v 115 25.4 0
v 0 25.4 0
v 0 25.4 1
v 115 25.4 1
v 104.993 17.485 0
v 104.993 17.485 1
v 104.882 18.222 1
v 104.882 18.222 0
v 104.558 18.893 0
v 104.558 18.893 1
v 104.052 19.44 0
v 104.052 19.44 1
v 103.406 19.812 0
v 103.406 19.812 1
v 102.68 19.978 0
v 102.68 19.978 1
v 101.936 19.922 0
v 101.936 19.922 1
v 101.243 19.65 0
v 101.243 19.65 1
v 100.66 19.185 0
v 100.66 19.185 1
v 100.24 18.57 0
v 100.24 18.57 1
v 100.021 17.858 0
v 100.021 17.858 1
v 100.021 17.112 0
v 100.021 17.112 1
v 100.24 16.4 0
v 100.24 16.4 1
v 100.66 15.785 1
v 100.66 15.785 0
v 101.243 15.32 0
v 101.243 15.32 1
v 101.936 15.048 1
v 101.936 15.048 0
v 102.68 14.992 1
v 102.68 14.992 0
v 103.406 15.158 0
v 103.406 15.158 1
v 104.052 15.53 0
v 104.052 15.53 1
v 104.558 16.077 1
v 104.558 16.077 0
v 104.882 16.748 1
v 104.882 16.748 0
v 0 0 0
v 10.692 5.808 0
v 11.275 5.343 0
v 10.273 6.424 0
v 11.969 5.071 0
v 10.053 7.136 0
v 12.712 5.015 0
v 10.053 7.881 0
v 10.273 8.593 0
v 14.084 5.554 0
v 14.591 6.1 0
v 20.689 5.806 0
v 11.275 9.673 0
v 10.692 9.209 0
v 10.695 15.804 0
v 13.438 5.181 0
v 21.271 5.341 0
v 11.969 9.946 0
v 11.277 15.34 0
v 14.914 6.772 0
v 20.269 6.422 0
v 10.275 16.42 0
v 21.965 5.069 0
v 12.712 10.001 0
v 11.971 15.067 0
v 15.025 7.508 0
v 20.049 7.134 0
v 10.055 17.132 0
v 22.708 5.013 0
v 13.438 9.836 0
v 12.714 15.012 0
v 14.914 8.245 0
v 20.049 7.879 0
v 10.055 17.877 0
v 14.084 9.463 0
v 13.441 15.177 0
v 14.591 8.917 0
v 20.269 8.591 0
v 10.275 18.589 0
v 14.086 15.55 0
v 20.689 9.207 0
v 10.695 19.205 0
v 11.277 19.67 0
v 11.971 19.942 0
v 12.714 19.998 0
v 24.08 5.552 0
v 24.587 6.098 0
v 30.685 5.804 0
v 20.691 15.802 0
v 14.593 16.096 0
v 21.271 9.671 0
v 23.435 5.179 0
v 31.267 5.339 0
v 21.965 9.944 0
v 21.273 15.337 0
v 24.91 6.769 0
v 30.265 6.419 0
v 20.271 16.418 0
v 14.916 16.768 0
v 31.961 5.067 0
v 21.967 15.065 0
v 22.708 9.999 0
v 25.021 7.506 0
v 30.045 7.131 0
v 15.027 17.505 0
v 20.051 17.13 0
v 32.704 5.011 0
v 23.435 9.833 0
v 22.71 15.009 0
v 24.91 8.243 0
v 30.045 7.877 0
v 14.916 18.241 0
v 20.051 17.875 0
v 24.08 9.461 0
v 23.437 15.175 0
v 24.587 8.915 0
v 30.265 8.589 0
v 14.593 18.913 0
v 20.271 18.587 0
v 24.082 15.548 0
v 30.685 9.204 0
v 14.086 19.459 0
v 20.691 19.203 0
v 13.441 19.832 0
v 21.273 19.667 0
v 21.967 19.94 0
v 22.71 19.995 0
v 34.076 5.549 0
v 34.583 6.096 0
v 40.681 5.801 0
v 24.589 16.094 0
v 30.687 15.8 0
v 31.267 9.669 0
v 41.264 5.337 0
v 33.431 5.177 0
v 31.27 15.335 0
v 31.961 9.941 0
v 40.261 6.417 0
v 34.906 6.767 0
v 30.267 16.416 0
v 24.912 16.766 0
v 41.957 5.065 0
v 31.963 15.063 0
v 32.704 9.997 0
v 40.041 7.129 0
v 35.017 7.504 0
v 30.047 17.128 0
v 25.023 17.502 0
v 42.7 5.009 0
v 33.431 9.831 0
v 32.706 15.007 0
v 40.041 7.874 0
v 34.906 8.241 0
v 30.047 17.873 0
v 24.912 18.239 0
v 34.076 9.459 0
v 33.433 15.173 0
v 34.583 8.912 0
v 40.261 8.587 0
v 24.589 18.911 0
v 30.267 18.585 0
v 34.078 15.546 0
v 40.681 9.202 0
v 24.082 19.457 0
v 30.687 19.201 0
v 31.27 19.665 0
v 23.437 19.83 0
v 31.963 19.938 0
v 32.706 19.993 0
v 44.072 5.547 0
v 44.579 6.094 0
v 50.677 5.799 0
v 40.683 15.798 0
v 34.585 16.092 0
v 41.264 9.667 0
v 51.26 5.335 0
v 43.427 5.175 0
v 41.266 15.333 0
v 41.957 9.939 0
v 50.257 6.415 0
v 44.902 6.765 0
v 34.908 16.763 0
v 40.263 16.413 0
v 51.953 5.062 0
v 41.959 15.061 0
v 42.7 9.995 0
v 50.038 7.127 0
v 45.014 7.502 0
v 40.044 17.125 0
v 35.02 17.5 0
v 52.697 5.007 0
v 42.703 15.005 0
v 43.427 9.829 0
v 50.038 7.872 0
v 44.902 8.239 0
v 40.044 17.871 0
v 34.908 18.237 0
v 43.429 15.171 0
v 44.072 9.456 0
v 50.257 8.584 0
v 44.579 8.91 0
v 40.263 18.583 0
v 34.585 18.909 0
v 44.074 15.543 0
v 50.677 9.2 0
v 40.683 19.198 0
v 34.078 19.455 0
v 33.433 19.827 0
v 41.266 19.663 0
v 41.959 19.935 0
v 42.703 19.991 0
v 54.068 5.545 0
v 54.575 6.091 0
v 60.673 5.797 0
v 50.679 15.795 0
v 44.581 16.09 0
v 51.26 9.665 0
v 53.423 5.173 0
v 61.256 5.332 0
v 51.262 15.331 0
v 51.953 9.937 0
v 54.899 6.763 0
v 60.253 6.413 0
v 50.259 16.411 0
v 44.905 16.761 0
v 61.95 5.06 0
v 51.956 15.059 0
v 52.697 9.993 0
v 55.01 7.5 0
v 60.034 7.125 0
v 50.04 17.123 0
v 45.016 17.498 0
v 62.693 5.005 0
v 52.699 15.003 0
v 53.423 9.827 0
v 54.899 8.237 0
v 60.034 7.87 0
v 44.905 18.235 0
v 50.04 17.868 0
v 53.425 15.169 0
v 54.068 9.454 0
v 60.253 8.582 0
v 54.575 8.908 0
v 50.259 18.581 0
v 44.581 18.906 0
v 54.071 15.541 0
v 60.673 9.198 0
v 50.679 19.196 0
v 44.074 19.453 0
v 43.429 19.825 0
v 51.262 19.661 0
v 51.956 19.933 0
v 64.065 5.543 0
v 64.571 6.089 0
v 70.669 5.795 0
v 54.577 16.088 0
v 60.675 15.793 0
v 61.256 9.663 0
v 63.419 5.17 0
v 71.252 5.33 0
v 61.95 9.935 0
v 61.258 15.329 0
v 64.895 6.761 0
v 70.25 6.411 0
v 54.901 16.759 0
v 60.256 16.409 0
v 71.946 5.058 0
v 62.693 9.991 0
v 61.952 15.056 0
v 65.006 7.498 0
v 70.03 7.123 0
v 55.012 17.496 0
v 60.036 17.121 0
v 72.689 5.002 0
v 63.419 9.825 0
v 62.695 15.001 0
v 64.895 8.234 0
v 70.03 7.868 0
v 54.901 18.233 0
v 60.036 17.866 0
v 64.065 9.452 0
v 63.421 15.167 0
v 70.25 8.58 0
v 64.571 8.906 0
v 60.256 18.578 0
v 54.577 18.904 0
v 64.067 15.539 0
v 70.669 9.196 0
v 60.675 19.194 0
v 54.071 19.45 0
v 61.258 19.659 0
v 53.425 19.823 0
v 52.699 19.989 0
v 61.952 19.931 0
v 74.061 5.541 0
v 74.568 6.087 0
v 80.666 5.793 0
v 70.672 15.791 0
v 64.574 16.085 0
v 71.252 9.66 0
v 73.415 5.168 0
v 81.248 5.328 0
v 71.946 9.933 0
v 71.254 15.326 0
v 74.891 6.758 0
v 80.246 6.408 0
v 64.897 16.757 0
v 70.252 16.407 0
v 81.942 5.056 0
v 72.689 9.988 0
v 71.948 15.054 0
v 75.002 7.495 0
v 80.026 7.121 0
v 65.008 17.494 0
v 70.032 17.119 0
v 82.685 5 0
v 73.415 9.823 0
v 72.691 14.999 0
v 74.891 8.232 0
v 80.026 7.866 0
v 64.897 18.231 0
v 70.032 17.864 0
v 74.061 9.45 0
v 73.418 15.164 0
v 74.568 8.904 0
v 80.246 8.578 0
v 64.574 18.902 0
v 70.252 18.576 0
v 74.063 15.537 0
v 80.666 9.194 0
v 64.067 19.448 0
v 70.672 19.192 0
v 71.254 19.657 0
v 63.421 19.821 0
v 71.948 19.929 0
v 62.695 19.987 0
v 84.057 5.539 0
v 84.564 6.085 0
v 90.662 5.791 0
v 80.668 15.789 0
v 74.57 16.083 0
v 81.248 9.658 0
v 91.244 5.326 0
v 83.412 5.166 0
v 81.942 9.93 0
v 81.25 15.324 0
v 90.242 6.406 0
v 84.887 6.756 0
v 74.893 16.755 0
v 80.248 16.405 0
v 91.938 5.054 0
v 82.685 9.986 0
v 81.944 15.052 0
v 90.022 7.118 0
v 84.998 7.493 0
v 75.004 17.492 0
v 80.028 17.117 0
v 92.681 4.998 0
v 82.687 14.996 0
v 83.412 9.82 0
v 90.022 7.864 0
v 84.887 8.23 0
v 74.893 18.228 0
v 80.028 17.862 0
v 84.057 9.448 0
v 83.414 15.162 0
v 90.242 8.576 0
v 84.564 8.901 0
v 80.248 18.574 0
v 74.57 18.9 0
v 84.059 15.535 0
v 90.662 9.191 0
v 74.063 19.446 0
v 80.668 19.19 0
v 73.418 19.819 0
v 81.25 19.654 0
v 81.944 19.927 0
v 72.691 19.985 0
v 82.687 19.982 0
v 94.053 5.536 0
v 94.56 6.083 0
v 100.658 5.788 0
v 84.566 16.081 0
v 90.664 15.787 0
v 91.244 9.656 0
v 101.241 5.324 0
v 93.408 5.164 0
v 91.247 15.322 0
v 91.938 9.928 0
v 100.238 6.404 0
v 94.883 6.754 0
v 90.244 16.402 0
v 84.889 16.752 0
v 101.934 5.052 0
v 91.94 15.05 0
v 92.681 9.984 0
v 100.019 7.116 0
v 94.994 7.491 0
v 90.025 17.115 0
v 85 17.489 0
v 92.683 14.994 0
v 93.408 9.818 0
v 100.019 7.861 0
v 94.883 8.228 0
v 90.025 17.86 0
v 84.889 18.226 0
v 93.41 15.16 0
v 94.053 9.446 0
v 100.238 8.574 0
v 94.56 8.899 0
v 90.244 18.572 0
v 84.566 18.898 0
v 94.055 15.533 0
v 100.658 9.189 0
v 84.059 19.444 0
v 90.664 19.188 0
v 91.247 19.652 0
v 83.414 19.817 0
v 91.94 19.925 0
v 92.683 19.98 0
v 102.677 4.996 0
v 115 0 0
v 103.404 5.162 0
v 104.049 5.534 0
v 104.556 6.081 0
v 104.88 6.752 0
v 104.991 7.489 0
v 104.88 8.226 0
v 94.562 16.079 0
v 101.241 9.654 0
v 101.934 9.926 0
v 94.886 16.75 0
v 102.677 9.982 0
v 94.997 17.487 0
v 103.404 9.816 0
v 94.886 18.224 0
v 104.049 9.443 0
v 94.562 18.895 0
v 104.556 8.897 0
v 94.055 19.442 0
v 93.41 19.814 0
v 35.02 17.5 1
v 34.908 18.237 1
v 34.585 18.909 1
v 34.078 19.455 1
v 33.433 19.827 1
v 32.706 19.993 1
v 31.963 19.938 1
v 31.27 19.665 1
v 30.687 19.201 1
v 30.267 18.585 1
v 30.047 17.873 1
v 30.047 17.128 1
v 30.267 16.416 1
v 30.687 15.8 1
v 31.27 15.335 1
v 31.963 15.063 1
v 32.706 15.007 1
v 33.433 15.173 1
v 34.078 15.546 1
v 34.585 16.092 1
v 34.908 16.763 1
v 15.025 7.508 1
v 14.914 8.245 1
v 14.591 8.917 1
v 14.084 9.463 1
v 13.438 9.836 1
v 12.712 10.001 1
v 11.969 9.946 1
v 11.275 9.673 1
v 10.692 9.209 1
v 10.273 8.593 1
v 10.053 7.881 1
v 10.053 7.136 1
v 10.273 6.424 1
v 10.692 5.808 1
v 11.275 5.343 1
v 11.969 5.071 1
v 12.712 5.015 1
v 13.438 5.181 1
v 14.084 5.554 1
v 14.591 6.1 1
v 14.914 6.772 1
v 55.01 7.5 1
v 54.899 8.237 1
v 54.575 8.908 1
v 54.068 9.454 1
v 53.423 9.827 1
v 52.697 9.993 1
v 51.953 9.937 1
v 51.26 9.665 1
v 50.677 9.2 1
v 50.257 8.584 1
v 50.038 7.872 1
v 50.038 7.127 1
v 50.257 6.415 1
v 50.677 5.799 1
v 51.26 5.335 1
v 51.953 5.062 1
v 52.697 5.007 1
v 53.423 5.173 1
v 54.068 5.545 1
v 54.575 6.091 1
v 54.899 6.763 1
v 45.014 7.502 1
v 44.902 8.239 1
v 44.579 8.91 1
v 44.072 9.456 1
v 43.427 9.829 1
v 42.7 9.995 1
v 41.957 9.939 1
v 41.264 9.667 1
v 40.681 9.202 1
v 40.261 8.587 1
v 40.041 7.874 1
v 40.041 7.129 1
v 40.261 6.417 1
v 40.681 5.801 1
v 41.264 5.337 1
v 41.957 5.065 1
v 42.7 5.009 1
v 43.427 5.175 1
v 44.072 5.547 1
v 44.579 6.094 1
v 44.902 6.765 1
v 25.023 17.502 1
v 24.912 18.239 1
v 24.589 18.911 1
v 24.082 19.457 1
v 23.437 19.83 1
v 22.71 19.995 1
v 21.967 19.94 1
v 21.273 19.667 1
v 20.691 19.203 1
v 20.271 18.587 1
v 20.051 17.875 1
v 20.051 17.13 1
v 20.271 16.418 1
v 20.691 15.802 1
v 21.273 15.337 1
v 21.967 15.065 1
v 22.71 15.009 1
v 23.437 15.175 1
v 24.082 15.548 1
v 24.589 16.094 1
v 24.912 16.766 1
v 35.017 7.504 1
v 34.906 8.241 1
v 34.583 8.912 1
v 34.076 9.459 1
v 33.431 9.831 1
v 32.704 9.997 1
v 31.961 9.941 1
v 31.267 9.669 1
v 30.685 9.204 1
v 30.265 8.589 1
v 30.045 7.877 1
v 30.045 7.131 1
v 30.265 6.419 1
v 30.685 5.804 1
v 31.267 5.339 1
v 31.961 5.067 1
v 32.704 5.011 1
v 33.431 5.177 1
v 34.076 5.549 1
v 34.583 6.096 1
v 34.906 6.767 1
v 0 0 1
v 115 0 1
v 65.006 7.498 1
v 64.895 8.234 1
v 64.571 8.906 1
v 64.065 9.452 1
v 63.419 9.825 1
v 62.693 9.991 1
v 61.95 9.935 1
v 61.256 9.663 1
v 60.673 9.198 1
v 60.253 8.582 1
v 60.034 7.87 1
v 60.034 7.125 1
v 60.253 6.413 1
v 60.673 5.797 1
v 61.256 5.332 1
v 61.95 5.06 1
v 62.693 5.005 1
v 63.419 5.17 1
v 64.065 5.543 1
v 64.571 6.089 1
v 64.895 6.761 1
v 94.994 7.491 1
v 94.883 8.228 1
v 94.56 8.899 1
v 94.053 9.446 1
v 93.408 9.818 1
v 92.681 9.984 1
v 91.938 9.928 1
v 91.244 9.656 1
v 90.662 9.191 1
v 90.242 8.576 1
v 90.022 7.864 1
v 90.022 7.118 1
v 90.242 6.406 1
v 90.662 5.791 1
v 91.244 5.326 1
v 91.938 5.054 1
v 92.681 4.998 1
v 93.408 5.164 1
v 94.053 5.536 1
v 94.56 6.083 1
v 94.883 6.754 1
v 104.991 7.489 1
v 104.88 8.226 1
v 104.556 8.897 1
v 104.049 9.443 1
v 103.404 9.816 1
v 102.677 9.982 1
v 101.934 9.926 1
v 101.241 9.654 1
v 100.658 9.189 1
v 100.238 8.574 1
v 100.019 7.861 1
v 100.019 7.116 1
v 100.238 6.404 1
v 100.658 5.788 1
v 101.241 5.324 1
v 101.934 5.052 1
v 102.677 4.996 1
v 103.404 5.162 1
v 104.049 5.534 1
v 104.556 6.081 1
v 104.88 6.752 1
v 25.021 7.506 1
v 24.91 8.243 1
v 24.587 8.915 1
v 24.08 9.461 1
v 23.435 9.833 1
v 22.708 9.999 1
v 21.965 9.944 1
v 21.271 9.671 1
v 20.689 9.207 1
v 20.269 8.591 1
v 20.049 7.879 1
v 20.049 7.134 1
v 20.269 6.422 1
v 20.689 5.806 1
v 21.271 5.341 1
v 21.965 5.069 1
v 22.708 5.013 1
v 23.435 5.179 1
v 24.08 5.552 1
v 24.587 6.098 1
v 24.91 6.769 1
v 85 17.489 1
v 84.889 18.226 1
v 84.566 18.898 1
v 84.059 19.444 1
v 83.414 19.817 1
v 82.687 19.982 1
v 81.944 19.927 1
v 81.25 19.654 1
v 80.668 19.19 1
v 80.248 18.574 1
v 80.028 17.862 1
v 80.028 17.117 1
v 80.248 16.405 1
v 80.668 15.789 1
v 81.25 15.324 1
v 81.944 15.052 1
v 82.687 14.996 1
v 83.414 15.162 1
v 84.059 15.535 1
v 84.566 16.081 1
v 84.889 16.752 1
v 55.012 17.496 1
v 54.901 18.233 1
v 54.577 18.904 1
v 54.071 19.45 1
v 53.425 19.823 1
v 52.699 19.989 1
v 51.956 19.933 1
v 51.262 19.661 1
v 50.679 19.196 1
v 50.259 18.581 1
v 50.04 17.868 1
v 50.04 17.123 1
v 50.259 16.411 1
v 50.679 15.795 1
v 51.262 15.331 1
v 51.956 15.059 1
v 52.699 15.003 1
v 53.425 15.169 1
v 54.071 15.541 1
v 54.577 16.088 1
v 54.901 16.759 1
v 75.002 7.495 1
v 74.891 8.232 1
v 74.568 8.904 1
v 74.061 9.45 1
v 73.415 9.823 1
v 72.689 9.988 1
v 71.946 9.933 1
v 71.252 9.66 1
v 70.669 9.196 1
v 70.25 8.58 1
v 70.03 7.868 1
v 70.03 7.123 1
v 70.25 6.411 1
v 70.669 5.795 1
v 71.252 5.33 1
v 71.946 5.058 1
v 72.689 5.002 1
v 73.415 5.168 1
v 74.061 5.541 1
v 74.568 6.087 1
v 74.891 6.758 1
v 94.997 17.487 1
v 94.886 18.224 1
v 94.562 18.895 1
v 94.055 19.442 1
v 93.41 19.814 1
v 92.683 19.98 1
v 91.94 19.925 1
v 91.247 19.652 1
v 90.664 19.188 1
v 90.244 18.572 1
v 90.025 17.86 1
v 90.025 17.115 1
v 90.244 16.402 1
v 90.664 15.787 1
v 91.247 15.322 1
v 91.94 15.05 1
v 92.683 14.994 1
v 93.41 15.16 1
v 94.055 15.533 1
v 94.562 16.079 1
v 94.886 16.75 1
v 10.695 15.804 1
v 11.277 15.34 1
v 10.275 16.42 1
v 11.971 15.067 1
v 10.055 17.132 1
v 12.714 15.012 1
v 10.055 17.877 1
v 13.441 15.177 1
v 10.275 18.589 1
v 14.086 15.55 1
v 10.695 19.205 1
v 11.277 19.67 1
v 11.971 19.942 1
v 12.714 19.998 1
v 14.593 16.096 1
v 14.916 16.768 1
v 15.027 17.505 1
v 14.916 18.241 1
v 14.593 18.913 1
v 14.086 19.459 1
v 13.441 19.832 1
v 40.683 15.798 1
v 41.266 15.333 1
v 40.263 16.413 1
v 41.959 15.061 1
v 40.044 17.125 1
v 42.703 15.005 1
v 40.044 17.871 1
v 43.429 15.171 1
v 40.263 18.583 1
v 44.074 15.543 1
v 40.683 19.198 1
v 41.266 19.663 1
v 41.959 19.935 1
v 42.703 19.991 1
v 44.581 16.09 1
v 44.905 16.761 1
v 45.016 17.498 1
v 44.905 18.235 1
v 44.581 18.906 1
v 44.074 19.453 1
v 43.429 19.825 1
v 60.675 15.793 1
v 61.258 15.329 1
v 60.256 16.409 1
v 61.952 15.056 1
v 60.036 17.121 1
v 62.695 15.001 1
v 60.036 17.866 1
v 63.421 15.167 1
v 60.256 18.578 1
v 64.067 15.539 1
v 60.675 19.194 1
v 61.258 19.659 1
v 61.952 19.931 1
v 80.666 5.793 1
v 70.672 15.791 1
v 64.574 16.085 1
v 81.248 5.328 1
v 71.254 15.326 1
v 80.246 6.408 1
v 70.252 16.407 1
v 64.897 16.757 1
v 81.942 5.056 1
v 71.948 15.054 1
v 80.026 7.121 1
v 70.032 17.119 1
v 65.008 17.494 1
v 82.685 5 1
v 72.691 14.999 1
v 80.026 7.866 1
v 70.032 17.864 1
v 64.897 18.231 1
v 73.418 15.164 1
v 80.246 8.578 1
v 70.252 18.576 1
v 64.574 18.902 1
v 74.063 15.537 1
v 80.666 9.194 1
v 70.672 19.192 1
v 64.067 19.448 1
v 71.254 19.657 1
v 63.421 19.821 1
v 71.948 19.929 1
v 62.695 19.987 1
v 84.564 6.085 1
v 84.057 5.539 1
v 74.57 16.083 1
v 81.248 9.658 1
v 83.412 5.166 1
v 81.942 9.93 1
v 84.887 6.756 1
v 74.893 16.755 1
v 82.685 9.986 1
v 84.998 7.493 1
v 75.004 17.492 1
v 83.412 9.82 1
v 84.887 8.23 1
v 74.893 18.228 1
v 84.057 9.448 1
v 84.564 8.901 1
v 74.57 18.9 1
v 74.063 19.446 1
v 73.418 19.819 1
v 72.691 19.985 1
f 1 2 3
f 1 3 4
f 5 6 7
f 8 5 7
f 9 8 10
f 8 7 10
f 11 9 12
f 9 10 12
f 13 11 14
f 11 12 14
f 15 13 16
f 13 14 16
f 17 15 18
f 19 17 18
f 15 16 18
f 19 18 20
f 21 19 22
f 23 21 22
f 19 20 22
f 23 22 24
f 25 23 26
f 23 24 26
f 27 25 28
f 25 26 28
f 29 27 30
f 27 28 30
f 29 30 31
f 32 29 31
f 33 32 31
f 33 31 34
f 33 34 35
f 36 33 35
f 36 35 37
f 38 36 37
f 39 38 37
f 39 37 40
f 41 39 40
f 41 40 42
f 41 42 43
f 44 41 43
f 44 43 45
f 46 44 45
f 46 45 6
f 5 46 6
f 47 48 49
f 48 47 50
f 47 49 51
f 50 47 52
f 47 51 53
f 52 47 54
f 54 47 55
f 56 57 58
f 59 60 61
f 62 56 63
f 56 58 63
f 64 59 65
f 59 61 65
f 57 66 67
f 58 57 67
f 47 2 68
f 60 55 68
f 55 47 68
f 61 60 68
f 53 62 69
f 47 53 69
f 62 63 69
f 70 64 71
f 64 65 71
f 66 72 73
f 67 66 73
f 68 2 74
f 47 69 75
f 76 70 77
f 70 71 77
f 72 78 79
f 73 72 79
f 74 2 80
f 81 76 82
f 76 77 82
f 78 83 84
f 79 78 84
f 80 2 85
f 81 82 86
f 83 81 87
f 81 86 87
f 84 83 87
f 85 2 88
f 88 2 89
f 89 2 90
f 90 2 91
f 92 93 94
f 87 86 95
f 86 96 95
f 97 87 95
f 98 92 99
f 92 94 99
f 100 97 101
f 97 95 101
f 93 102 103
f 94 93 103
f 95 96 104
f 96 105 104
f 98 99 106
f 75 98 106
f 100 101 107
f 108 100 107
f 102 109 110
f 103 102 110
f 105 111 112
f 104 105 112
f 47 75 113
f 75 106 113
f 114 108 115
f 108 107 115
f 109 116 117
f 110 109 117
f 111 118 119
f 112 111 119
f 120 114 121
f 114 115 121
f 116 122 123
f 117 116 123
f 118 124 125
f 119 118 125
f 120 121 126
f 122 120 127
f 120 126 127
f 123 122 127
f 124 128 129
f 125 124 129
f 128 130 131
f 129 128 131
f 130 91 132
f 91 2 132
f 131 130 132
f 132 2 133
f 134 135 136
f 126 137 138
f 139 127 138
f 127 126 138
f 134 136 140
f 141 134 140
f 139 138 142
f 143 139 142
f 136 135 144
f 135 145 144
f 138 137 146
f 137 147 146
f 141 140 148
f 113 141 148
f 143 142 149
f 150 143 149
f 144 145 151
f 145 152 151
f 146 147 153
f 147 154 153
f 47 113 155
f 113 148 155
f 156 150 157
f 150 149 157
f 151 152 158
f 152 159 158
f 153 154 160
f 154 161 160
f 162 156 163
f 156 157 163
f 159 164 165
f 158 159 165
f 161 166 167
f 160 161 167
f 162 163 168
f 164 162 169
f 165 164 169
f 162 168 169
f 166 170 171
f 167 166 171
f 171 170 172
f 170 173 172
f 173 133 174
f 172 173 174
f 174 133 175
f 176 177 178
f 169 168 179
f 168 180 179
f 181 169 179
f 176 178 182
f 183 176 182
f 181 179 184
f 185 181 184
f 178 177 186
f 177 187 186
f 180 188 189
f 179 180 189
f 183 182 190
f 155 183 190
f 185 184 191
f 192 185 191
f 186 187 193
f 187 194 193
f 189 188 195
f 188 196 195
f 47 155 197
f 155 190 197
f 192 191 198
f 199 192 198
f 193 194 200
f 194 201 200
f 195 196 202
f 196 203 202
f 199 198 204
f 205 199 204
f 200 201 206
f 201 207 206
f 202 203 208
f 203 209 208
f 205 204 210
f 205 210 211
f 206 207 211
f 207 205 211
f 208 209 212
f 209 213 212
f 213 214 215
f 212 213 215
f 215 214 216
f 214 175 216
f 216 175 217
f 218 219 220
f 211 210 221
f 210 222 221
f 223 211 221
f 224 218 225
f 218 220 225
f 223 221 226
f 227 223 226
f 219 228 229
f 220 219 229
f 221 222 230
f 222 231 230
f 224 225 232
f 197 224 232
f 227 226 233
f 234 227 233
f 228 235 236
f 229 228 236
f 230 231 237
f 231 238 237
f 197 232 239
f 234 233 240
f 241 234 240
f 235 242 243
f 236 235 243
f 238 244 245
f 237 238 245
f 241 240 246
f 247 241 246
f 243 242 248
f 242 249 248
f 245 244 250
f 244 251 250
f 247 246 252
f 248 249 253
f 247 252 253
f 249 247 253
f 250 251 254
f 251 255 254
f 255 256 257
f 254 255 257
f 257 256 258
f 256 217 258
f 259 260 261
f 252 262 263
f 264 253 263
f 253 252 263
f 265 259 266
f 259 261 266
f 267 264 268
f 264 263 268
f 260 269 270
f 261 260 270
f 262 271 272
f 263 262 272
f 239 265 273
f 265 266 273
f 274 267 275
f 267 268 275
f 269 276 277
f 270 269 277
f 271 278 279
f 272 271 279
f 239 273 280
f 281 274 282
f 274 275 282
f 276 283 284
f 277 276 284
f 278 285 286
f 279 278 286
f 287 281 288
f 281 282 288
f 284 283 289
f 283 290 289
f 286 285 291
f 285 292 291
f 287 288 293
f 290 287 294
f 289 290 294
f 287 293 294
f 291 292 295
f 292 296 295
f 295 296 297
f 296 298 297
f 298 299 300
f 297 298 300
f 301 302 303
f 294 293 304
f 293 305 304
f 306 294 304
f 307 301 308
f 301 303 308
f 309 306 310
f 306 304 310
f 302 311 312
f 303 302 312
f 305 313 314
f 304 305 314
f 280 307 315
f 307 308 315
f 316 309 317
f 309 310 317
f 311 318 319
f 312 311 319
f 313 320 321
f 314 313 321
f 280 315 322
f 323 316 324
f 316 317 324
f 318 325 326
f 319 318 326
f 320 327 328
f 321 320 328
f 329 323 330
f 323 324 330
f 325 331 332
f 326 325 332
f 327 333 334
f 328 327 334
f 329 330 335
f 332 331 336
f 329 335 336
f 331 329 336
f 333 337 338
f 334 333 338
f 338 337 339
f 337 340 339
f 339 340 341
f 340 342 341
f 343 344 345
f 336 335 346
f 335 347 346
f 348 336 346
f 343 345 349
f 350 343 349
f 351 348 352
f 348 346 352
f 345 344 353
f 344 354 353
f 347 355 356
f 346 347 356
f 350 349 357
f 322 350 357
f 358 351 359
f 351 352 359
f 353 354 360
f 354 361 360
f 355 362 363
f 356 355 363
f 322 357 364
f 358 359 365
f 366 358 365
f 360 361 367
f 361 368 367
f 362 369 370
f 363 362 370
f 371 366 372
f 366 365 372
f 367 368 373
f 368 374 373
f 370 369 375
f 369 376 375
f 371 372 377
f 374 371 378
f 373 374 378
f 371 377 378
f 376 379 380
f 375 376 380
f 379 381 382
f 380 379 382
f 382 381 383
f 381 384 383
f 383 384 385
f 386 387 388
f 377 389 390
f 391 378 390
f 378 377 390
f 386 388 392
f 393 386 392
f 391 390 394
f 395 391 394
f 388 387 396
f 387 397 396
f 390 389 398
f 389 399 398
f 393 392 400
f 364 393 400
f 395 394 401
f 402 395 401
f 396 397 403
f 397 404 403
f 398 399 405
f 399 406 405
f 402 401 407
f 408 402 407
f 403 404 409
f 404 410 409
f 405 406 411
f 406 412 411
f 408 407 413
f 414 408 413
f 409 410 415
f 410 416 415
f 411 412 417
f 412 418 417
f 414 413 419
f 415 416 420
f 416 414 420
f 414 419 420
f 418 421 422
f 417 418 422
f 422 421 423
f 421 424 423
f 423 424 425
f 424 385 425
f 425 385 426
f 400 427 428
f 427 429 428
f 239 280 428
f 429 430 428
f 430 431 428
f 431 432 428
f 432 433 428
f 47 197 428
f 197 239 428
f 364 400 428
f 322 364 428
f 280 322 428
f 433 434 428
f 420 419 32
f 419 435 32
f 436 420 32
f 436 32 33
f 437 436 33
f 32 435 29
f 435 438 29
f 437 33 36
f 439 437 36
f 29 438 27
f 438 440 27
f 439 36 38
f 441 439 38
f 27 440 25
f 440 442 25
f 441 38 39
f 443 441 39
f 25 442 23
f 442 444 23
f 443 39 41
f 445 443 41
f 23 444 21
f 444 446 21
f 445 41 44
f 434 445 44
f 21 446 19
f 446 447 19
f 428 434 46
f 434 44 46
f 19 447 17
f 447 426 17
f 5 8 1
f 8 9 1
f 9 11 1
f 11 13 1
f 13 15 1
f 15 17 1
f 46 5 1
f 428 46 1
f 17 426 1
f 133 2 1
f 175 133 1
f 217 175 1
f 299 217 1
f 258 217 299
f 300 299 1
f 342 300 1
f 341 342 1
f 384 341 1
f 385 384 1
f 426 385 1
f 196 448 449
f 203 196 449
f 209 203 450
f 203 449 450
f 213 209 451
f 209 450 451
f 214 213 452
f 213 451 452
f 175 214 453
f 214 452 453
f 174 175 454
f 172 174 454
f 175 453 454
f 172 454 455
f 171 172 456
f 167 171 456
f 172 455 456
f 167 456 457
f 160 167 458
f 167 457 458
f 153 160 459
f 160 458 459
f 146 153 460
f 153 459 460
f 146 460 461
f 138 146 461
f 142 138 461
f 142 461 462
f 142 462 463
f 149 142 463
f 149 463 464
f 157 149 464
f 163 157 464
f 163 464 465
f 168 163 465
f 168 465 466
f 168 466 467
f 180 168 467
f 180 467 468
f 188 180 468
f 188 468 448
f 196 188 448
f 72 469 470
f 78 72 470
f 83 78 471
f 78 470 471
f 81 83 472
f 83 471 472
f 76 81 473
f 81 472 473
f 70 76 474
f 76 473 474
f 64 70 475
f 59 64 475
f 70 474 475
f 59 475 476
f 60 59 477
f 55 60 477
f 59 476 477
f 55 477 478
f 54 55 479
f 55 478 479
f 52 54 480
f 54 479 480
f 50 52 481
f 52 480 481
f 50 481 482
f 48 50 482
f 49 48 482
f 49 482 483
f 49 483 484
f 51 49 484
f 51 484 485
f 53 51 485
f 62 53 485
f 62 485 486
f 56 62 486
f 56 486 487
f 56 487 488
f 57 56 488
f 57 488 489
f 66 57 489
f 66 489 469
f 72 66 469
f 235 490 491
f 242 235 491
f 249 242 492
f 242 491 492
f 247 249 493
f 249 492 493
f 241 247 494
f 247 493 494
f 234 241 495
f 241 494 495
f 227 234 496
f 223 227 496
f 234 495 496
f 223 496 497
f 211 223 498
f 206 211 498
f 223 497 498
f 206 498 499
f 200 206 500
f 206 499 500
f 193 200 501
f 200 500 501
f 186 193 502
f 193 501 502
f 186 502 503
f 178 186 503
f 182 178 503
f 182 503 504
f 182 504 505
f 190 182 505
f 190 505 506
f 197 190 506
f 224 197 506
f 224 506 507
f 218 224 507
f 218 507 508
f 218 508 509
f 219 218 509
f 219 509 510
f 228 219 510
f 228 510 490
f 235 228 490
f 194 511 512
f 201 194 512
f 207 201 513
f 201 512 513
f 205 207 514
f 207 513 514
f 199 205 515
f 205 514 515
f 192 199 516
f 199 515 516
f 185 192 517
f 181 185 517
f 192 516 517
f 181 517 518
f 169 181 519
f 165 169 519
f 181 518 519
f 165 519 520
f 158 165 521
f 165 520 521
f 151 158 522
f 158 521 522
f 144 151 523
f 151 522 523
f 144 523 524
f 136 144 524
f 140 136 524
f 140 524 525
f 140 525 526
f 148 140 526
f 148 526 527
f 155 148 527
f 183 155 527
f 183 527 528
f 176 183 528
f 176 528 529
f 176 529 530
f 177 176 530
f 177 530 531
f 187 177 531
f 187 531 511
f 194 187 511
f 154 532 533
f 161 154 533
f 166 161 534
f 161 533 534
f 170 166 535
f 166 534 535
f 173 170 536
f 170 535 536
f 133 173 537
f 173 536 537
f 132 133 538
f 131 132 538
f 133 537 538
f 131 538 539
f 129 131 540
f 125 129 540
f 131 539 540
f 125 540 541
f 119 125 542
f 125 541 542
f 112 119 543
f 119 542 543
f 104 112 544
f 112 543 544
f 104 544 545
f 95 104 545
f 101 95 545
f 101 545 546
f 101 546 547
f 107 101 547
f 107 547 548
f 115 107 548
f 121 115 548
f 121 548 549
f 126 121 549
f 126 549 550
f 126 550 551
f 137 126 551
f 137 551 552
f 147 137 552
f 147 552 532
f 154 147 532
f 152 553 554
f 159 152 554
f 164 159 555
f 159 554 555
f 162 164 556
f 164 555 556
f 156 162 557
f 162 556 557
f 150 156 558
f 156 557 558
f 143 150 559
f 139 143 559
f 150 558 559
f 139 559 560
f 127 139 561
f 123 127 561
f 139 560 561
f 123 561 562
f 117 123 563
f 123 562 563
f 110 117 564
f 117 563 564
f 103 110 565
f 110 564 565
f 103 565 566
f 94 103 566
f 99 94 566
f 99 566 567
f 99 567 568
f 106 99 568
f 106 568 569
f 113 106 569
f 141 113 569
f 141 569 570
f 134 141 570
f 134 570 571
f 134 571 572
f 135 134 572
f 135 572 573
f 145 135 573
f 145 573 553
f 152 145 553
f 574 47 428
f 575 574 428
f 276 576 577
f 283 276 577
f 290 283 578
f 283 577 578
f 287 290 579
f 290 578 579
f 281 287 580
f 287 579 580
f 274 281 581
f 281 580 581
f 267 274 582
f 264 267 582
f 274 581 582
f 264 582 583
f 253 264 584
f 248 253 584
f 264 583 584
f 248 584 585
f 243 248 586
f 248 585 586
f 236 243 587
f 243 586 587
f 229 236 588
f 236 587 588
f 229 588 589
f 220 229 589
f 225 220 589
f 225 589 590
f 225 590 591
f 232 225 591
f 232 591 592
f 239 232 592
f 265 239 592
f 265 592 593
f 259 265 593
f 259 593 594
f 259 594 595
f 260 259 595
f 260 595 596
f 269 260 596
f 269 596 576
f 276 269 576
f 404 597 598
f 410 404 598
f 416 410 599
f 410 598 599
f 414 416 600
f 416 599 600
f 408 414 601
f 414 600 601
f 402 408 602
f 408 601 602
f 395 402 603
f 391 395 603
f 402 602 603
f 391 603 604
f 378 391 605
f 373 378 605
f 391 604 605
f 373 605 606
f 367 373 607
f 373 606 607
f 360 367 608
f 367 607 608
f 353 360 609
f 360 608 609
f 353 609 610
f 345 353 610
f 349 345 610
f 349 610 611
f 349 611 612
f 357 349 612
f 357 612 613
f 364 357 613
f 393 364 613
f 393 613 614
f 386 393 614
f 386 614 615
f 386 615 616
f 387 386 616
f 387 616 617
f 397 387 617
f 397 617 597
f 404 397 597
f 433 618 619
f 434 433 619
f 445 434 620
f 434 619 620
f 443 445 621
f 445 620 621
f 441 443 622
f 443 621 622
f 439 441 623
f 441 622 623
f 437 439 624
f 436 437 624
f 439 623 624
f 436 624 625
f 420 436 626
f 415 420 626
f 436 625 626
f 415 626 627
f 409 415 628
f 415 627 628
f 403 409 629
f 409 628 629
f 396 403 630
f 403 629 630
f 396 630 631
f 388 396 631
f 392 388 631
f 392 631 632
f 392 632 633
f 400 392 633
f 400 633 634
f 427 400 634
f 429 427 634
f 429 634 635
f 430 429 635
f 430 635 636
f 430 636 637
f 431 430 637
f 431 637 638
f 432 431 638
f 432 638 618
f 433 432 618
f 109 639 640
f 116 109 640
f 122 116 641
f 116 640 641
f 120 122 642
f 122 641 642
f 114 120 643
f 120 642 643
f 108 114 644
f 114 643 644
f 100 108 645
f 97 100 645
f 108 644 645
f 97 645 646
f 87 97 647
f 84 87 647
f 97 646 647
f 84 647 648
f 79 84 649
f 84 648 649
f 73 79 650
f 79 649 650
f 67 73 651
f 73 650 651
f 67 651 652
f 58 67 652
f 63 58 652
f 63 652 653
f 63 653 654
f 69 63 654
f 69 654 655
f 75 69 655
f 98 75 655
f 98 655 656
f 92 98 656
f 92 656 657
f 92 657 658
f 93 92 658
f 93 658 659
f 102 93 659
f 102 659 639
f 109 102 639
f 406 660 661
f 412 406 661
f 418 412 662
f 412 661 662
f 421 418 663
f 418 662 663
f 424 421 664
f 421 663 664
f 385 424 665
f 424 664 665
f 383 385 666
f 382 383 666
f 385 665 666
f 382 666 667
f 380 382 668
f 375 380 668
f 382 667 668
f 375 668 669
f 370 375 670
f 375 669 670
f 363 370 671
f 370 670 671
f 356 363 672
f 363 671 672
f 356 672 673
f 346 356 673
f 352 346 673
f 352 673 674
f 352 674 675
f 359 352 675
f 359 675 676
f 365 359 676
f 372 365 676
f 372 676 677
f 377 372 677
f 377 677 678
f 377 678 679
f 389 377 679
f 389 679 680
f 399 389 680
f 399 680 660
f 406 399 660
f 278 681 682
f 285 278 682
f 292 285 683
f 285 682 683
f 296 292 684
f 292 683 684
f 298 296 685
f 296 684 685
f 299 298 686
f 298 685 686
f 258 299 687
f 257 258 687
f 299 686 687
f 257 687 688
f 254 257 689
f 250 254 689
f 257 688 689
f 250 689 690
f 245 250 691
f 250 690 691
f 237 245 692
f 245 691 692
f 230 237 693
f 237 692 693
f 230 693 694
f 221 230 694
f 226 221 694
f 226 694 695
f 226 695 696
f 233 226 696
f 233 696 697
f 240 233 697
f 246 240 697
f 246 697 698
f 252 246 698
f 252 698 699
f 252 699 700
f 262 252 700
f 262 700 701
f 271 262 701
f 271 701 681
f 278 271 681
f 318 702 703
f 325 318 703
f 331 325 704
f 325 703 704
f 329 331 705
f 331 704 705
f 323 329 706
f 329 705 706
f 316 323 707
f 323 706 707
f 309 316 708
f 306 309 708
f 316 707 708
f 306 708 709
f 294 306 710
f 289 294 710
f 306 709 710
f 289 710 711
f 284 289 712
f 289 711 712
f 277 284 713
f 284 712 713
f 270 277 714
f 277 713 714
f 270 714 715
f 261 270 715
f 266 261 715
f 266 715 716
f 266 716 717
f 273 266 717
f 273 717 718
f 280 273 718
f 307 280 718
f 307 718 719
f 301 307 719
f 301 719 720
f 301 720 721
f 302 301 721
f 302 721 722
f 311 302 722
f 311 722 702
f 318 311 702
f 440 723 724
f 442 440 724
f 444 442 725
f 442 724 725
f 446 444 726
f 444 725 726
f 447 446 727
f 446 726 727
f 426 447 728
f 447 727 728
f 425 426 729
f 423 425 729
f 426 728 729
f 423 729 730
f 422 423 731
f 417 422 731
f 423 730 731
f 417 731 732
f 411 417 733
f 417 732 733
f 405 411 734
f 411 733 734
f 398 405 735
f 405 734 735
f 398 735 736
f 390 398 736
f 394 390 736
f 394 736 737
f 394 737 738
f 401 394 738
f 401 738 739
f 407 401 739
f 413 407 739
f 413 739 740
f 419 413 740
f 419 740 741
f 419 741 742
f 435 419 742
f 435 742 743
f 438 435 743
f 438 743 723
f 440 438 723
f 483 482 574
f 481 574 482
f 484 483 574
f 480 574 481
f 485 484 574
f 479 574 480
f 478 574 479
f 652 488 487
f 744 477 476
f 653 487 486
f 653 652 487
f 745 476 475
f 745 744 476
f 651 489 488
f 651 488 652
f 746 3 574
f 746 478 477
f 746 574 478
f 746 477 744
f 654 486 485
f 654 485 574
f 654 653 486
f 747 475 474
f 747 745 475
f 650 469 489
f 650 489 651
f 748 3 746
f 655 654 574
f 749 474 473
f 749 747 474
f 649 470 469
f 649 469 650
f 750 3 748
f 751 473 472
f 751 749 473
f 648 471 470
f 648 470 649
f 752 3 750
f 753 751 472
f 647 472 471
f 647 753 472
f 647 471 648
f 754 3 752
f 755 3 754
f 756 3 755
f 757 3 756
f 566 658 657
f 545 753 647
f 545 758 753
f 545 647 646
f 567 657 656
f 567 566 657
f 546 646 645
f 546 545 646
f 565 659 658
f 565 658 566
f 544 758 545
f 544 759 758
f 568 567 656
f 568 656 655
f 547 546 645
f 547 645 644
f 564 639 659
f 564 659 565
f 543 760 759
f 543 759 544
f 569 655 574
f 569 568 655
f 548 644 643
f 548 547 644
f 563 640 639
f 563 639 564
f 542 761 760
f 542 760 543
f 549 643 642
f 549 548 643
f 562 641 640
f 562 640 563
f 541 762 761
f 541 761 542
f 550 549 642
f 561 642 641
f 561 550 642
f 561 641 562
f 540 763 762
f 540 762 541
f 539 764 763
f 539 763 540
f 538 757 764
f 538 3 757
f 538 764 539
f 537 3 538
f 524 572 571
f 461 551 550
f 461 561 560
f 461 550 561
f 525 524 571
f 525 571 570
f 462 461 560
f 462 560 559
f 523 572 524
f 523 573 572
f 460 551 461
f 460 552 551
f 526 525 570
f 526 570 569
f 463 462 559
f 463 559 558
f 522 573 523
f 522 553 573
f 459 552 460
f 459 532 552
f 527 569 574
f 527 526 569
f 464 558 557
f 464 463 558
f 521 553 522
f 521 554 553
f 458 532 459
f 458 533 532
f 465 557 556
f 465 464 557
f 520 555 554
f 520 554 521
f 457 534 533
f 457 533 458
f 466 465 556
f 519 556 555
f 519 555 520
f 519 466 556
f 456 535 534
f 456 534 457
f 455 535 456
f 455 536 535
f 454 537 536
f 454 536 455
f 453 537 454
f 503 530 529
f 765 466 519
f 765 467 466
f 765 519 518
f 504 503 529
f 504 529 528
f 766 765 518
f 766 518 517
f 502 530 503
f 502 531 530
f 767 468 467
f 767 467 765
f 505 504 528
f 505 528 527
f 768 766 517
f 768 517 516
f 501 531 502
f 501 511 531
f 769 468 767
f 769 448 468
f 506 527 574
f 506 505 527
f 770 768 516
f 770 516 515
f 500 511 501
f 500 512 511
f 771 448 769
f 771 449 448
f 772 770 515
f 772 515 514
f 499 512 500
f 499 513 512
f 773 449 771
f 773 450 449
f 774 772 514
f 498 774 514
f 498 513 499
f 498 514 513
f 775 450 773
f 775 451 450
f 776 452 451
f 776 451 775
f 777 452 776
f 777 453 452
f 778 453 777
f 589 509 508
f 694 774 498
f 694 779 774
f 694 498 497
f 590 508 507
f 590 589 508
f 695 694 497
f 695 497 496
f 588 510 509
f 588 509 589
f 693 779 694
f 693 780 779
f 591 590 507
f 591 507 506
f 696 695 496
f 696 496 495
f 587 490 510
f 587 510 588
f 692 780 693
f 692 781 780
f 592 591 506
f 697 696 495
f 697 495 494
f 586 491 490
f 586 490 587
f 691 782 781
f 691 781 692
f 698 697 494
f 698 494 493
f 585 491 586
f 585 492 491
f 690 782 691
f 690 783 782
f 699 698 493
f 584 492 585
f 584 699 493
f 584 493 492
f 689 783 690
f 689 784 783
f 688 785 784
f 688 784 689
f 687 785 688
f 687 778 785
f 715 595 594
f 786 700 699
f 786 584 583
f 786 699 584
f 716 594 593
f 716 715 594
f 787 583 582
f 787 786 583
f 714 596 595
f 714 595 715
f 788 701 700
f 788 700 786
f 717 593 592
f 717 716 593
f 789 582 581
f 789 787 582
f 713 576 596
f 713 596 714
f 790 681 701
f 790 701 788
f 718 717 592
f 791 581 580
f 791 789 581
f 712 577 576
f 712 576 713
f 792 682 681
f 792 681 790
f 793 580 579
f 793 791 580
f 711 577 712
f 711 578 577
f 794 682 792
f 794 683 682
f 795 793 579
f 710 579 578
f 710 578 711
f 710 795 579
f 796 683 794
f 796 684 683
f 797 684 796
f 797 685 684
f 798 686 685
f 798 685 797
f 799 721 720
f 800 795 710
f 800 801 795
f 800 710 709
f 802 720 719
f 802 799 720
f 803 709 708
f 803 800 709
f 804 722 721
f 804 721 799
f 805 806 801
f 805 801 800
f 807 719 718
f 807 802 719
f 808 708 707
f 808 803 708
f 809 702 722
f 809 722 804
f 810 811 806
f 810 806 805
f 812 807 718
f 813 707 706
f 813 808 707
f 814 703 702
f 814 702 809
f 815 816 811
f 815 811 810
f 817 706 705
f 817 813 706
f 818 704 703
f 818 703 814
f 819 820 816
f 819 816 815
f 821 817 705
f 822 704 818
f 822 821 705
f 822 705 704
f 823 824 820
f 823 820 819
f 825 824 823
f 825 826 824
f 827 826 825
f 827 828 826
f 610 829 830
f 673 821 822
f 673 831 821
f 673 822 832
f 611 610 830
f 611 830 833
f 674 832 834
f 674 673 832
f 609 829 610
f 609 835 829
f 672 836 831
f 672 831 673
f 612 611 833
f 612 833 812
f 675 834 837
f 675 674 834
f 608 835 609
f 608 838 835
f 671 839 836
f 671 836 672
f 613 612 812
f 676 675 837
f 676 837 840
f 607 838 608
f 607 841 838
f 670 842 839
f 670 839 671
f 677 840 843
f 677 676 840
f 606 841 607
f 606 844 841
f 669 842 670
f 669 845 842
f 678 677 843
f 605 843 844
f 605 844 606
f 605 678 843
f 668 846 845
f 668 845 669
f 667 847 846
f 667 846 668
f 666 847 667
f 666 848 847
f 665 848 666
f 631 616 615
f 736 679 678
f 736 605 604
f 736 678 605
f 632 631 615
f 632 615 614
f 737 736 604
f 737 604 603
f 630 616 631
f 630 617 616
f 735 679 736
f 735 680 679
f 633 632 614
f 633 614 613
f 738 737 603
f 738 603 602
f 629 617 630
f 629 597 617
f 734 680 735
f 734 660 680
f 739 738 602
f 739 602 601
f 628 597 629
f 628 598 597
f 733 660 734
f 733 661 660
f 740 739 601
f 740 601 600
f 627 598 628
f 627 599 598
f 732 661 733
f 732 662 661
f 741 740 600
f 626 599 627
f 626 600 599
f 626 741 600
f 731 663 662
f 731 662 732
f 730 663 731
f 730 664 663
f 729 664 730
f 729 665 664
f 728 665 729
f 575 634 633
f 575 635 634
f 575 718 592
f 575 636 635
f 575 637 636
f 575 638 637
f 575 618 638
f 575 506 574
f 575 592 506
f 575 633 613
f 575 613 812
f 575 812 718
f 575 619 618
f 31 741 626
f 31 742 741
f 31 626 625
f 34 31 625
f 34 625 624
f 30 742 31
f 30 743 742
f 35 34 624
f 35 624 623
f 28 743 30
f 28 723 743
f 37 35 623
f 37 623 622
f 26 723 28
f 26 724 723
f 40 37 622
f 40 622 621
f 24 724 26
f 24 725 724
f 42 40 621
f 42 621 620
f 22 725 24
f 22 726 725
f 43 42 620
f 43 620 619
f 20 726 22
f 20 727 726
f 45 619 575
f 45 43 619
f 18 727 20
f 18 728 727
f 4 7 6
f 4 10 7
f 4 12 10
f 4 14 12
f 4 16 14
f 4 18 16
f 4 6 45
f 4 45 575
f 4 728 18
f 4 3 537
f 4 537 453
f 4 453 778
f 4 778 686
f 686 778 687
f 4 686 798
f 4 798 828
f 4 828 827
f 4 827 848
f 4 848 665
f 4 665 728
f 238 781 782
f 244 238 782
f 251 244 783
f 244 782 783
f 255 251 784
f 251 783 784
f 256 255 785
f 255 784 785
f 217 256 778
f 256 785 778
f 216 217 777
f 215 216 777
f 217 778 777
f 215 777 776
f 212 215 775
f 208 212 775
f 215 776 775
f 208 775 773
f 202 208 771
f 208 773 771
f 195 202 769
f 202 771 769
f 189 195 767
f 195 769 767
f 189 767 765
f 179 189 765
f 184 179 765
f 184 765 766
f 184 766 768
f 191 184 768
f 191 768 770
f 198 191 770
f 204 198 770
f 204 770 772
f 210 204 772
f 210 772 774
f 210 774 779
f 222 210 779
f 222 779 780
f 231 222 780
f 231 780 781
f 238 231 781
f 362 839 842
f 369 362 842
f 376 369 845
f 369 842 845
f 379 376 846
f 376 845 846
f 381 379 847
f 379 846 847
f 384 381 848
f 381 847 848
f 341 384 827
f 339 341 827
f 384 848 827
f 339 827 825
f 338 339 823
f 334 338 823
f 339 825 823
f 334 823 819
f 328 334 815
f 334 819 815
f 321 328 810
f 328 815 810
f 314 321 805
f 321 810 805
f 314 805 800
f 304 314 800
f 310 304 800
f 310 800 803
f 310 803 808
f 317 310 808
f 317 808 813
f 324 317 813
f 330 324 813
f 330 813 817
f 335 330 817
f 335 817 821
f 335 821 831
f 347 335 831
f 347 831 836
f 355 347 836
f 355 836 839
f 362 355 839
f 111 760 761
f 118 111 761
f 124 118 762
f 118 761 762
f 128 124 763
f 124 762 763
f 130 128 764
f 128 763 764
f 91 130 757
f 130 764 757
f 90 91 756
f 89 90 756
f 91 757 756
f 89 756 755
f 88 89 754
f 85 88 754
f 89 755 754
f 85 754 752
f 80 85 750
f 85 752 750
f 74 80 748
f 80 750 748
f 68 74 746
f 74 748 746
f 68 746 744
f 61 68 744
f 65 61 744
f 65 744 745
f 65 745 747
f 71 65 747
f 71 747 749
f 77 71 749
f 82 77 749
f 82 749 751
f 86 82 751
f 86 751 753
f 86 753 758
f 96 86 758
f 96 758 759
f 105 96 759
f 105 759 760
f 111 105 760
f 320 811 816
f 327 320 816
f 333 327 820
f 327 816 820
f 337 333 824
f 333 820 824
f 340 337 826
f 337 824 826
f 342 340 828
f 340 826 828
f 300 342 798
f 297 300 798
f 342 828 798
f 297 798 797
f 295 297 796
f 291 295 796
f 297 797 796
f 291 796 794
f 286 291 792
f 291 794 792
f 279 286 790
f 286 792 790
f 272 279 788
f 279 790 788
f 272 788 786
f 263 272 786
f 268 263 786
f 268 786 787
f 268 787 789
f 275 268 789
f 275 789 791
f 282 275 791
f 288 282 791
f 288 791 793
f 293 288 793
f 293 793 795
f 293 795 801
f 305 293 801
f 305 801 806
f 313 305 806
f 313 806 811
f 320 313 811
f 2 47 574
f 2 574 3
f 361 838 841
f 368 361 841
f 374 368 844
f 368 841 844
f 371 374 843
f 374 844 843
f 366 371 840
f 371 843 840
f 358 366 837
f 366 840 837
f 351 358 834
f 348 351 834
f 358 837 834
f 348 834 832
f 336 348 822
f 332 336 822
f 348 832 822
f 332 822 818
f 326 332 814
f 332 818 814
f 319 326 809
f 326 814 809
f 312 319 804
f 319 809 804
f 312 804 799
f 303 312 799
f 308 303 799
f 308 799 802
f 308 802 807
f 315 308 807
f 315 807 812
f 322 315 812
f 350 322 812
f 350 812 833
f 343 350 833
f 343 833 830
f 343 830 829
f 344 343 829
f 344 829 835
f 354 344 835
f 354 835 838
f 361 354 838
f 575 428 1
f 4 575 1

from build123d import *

# Parameters (mm, degrees)
BOX_W        = 115
BOX_H        = 25.4
BOX_DEPTH    = 1
SKETCH_R     = 2.5
POCKET_DEPTH = 5


with BuildPart() as part:
    # Box → Box (new body)
    with BuildSketch(Plane.XY):
        with Locations((57.5, 12.7)):
            Rectangle(BOX_W, BOX_H)
    extrude(amount=BOX_DEPTH)

    # Sketch (on Face6 of BaseFeature) → Pocket (cut)
    with BuildSketch(Plane.XY.offset(1)):
        with Locations((12.527164, 17.504574)):
            Circle(SKETCH_R)
        with Locations((22.523344, 17.5024)):
            Circle(SKETCH_R)
        with Locations((32.519524, 17.500226)):
            Circle(SKETCH_R)
        with Locations((42.515704, 17.498052)):
            Circle(SKETCH_R)
        with Locations((52.511884, 17.495878)):
            Circle(SKETCH_R)
        with Locations((62.508064, 17.493704)):
            Circle(SKETCH_R)
        with Locations((72.504244, 17.49153)):
            Circle(SKETCH_R)
        with Locations((82.500424, 17.489356)):
            Circle(SKETCH_R)
        with Locations((92.496604, 17.487182)):
            Circle(SKETCH_R)
        with Locations((102.492784, 17.485008)):
            Circle(SKETCH_R)
        with Locations((12.52499, 7.508394)):
            Circle(SKETCH_R)
        with Locations((22.52117, 7.50622)):
            Circle(SKETCH_R)
        with Locations((32.51735, 7.504046)):
            Circle(SKETCH_R)
        with Locations((42.51353, 7.501872)):
            Circle(SKETCH_R)
        with Locations((52.50971, 7.499698)):
            Circle(SKETCH_R)
        with Locations((62.50589, 7.497524)):
            Circle(SKETCH_R)
        with Locations((72.50207, 7.49535)):
            Circle(SKETCH_R)
        with Locations((82.49825, 7.493176)):
            Circle(SKETCH_R)
        with Locations((92.49443, 7.491002)):
            Circle(SKETCH_R)
        with Locations((102.49061, 7.488828)):
            Circle(SKETCH_R)
    extrude(amount=-POCKET_DEPTH, mode=Mode.SUBTRACT)


solid = part.part
